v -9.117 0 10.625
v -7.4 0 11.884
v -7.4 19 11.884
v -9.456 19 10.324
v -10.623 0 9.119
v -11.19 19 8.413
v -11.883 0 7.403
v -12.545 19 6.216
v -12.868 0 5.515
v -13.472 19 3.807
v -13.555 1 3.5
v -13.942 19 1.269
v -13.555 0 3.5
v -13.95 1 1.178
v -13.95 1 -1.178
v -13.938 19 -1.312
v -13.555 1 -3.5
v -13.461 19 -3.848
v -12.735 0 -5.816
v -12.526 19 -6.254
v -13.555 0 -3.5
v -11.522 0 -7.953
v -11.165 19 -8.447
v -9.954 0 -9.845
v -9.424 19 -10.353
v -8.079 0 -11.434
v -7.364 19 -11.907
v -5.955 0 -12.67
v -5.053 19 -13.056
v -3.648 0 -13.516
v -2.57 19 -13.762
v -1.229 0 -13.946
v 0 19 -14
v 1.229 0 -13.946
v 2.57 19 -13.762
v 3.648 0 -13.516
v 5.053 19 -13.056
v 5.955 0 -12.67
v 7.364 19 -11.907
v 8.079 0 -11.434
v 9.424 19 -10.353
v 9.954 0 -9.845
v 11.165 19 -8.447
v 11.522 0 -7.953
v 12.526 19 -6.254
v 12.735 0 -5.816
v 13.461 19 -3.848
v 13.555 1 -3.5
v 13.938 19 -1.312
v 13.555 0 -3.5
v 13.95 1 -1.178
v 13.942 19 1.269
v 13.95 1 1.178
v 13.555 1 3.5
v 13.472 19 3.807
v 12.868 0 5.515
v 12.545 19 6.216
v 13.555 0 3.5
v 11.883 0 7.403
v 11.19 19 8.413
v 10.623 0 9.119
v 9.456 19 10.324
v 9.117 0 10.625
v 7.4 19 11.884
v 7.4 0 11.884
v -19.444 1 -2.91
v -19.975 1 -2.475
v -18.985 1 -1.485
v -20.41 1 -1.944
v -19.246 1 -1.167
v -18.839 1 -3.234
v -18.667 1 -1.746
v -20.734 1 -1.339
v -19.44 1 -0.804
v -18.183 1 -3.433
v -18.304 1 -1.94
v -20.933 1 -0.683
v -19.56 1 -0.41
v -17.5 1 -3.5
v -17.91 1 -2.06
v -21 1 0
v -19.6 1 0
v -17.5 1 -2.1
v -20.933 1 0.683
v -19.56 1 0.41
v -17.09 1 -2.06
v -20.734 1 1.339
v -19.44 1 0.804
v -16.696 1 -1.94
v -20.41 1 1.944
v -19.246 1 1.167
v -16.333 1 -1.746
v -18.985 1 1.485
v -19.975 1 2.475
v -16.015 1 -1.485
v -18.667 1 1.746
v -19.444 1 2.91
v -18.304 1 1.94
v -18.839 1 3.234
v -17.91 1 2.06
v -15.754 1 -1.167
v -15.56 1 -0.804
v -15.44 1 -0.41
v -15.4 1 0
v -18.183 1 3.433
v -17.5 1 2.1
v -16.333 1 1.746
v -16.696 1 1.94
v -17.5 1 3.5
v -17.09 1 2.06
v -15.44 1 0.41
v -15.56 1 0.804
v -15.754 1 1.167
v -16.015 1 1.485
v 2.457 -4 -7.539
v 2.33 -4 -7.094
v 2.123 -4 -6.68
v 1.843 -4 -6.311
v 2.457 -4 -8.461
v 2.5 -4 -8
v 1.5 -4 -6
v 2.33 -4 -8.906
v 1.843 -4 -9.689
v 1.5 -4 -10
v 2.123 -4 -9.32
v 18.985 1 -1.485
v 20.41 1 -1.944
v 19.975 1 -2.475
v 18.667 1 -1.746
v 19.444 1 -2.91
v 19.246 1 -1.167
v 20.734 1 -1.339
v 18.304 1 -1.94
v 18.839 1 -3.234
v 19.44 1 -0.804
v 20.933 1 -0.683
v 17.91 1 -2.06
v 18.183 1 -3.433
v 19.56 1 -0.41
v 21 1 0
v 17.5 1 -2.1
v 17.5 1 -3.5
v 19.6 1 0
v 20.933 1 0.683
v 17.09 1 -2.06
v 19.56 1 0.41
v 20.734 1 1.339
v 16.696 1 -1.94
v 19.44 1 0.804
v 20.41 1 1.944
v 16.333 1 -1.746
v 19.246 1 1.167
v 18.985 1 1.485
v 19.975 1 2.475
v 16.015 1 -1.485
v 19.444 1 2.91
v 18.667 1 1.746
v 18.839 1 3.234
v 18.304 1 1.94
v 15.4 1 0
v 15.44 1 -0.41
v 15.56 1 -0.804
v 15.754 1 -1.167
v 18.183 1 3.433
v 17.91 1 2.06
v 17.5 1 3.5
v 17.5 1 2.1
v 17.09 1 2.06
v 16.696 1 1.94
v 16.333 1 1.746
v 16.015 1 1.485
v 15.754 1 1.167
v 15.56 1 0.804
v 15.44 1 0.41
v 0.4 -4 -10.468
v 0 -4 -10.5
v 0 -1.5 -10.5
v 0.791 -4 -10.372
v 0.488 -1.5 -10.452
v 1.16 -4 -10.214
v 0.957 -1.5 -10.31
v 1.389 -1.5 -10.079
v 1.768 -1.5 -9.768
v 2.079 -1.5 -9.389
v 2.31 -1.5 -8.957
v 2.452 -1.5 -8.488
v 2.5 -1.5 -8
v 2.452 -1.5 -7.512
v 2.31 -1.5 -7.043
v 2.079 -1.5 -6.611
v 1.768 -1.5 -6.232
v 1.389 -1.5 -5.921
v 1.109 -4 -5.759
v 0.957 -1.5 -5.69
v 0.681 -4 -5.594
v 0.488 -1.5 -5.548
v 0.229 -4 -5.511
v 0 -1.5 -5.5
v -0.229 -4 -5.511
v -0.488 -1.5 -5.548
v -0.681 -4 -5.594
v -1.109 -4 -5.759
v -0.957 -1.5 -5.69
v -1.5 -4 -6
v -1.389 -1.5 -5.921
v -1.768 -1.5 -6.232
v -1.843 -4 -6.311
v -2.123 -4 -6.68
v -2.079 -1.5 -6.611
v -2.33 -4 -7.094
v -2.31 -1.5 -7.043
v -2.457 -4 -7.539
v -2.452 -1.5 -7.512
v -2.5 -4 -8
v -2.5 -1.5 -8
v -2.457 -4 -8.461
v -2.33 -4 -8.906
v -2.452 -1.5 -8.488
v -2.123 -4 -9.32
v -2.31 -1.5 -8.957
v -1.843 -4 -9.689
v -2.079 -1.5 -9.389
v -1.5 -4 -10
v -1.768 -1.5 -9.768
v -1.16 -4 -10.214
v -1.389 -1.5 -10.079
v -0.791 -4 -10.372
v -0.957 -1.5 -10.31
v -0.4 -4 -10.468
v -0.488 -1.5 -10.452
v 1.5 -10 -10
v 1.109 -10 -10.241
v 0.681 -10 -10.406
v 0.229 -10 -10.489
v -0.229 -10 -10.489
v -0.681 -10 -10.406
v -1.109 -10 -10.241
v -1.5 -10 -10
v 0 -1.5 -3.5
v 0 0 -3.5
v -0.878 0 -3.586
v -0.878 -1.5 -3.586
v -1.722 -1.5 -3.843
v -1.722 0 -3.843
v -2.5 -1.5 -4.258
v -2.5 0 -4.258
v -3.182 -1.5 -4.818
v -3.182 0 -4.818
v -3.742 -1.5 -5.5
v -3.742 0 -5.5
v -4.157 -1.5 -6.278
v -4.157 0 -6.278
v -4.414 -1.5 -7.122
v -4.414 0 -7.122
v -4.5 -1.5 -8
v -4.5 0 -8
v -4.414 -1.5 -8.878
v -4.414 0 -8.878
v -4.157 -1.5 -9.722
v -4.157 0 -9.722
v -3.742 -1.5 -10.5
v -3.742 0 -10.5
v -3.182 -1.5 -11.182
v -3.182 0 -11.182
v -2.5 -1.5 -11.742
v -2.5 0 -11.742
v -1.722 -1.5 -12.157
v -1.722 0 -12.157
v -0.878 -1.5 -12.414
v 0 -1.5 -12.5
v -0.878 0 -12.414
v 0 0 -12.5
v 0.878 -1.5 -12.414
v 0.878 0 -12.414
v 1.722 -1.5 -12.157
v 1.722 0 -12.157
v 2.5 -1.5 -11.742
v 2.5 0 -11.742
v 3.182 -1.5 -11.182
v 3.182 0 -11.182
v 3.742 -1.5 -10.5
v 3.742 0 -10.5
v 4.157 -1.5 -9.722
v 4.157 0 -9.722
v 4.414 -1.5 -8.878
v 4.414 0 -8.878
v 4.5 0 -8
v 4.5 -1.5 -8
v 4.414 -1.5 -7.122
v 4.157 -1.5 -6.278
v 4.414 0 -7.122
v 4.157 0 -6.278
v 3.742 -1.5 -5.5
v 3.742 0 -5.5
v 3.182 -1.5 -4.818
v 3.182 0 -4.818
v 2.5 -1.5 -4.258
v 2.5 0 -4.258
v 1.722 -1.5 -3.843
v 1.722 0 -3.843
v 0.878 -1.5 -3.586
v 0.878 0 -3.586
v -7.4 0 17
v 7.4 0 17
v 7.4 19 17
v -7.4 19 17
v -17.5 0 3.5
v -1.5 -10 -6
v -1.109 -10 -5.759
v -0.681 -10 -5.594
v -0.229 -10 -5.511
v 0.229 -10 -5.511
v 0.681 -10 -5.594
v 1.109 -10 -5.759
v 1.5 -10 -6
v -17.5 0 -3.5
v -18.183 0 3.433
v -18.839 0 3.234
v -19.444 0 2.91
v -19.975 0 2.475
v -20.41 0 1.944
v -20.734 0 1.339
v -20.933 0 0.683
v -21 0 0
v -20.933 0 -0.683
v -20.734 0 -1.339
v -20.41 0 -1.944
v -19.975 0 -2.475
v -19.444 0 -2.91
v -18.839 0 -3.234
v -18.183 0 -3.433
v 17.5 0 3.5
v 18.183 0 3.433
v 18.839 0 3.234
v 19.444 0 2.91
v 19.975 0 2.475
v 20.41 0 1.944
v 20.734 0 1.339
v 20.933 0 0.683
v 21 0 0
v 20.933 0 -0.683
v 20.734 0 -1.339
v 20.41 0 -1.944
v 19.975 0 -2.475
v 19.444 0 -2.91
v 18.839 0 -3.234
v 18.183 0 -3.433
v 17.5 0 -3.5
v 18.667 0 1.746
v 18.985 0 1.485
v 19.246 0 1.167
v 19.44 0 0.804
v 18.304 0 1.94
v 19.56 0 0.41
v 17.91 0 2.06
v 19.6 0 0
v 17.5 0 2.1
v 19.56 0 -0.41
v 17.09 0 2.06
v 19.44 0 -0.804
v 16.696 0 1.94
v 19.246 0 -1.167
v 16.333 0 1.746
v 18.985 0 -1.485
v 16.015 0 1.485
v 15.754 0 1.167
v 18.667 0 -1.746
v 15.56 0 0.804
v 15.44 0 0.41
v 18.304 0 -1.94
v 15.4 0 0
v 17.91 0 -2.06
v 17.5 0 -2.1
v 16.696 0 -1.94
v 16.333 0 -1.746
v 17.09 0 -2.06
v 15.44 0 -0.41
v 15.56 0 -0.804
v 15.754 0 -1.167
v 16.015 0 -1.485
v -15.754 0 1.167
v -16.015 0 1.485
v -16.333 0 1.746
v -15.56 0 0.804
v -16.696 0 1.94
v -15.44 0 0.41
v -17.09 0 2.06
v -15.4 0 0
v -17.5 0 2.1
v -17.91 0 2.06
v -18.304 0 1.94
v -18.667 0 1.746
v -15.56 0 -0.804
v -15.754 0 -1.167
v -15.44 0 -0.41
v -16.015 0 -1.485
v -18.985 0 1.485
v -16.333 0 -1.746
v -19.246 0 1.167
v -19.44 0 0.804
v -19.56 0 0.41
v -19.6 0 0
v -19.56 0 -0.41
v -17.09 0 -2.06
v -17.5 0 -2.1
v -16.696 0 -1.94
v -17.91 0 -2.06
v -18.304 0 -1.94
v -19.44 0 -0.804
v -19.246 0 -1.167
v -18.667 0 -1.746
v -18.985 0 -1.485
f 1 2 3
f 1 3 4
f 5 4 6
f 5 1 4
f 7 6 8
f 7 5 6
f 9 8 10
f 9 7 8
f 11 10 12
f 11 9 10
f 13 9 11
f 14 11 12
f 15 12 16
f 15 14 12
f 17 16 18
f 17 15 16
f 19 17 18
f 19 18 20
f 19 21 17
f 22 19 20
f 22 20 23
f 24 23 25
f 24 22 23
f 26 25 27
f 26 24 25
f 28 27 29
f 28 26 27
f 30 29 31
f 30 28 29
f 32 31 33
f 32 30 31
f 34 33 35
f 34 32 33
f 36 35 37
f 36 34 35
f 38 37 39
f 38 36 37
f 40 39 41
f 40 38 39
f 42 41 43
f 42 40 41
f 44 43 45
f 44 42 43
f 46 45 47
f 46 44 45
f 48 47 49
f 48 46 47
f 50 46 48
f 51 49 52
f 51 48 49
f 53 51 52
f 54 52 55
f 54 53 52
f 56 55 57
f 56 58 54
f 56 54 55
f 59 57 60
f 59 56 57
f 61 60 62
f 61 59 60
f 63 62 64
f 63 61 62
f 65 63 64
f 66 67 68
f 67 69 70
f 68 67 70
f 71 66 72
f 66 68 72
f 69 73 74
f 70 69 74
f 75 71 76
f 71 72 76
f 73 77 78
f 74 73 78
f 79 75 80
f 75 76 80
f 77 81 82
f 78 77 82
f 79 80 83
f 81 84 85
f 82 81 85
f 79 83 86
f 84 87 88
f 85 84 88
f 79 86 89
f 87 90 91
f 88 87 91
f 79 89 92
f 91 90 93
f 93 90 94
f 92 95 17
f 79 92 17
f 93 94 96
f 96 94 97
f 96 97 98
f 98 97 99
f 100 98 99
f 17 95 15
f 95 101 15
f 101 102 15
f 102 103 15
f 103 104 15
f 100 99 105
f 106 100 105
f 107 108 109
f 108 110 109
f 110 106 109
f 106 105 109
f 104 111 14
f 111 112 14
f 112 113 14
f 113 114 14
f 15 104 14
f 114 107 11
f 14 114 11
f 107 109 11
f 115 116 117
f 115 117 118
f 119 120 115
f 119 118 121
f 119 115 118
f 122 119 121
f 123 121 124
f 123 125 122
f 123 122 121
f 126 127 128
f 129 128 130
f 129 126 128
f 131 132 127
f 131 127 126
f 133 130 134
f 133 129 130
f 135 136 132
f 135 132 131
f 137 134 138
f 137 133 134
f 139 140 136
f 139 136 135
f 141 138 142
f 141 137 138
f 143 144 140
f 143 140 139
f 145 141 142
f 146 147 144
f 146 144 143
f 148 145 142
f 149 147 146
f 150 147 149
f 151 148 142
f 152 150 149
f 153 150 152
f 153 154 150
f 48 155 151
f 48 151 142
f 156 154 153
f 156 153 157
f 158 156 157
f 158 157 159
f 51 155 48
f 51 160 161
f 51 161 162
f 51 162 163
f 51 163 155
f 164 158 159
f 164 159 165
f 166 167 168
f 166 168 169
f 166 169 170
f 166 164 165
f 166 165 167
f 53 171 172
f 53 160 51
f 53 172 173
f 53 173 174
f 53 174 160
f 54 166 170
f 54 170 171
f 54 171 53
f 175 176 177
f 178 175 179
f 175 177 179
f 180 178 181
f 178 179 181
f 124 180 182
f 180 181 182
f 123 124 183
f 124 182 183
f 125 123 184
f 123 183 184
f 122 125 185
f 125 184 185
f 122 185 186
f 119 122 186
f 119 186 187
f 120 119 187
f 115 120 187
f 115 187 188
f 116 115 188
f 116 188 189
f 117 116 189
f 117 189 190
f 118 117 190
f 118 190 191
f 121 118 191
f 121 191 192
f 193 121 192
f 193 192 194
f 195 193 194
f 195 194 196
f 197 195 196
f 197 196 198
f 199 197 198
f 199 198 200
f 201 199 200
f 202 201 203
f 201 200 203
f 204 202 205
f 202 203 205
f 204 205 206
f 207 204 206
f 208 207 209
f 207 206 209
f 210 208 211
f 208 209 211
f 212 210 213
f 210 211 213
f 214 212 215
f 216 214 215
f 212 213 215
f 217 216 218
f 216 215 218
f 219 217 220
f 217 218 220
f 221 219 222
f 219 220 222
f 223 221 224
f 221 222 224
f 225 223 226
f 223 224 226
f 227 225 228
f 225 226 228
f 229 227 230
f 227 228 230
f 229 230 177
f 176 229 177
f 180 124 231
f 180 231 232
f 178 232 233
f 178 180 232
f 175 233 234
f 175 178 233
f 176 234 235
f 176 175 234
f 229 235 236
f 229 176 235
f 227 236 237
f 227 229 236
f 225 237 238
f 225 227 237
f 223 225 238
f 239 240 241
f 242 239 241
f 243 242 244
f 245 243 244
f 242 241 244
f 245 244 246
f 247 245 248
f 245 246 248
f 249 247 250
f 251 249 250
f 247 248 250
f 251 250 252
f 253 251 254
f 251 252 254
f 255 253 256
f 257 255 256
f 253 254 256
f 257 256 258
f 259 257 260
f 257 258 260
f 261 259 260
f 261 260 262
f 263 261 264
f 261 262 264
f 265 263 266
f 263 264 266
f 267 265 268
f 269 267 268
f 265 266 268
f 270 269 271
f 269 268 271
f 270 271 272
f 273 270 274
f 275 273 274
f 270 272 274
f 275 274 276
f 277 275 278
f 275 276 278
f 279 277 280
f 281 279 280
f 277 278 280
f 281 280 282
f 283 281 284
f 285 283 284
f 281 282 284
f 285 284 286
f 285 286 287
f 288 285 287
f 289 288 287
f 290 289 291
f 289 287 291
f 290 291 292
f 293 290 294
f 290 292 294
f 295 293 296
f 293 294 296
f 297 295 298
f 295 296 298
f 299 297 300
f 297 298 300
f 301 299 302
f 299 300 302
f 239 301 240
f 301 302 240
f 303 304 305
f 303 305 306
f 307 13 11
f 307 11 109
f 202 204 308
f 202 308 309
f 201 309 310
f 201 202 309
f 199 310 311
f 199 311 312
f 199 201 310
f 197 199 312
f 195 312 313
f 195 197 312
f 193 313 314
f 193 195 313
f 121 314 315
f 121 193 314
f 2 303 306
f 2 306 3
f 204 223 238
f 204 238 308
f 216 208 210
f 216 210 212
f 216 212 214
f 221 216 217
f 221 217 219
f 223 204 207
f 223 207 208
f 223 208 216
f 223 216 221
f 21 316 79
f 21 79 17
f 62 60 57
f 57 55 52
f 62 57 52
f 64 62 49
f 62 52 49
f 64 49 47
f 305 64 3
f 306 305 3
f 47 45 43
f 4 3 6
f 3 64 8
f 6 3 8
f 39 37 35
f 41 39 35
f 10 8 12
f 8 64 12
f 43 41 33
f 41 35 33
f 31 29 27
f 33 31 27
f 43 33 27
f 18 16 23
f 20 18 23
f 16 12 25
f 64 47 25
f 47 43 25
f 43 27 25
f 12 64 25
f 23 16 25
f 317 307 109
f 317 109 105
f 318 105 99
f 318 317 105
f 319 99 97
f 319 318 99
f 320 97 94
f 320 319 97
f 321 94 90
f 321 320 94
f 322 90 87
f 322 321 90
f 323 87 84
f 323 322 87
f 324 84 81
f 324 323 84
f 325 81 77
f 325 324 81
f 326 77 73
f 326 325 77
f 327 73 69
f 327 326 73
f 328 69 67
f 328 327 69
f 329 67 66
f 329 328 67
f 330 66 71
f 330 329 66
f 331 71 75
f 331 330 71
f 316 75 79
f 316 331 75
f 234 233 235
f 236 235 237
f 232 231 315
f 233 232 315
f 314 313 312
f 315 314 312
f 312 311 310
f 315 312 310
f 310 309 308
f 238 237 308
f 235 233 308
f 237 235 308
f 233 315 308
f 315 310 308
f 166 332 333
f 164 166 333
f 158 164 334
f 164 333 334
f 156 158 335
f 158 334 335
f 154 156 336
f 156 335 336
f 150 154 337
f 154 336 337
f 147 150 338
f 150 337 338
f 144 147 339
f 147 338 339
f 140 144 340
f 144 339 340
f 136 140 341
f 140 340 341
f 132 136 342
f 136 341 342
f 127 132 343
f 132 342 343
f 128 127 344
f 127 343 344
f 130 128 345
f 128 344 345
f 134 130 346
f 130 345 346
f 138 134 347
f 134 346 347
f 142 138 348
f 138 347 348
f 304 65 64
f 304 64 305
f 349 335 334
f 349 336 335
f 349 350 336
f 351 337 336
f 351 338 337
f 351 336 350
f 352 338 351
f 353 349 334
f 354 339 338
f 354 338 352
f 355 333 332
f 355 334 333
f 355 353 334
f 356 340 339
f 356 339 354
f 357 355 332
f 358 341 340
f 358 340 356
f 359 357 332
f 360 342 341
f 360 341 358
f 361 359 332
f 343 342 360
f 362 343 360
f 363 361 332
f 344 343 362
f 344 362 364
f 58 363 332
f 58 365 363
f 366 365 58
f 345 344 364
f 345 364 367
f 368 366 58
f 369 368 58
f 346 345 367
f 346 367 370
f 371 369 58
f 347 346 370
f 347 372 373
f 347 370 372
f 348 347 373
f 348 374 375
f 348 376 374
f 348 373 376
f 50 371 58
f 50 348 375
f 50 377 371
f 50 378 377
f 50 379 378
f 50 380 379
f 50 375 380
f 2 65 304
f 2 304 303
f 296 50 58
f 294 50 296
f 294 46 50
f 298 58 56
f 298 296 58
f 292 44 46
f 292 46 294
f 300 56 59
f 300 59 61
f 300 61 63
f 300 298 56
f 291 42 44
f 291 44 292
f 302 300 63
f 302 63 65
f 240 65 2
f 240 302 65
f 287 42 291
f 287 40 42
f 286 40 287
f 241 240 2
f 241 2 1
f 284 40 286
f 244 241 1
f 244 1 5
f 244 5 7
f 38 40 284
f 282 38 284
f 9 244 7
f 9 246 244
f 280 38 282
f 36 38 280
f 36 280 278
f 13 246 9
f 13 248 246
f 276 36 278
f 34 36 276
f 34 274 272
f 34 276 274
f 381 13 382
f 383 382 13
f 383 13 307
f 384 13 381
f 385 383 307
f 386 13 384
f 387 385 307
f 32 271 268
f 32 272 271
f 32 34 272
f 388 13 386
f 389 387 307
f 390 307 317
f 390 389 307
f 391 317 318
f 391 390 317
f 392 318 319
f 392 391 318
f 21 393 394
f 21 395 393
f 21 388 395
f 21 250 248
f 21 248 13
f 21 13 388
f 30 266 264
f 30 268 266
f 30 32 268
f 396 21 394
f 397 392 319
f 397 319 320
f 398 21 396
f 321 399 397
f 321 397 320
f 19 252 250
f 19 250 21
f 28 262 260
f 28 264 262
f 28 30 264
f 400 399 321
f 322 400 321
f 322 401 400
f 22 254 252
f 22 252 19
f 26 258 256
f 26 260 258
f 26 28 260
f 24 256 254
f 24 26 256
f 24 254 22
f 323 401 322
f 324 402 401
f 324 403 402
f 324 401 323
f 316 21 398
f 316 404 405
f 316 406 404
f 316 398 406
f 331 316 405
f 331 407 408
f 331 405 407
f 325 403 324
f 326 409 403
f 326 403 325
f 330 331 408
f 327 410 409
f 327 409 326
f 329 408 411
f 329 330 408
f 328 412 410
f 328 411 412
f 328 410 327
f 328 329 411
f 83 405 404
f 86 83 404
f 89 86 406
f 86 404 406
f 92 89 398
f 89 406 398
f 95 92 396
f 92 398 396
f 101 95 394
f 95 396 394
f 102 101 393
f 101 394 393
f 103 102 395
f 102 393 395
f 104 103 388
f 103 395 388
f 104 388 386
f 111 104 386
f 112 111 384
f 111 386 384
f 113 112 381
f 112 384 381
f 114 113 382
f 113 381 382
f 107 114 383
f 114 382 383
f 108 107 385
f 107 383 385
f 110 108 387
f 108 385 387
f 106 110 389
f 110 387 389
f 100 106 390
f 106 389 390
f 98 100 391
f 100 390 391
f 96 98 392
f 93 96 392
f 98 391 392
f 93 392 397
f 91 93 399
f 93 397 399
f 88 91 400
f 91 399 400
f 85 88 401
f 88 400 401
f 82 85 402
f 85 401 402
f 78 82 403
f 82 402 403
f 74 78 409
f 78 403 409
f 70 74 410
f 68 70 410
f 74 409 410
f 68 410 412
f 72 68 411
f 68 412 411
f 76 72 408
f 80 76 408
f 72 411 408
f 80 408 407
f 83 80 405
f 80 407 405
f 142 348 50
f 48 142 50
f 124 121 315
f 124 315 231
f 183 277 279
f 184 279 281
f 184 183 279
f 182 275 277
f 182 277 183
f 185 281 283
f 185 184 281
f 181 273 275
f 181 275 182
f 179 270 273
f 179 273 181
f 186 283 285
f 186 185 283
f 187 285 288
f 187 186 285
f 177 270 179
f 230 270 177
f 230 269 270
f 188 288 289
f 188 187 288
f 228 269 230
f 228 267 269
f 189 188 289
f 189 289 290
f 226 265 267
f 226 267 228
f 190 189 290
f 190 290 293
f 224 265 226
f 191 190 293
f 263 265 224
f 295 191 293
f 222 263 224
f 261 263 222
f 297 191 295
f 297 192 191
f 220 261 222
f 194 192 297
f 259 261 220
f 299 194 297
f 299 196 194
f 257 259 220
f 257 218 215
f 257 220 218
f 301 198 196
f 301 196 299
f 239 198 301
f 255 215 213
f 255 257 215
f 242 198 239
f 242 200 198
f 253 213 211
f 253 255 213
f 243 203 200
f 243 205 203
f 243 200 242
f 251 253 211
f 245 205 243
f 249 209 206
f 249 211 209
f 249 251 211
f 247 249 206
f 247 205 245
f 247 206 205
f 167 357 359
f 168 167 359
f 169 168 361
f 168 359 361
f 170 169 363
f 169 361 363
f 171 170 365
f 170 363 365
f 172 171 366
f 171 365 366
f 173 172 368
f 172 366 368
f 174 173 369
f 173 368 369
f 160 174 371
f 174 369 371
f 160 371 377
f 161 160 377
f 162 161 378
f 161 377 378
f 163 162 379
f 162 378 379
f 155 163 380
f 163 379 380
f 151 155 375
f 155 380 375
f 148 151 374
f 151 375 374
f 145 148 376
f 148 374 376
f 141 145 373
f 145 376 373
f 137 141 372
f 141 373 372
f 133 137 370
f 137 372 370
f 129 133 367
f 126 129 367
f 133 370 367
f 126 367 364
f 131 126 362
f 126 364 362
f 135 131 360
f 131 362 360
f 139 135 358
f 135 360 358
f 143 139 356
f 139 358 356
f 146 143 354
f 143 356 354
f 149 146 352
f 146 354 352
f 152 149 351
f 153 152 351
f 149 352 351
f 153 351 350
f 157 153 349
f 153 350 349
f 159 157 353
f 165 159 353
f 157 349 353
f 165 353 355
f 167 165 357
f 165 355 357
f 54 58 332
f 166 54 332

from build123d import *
from build123d.topology import SkipClean

# Parameters (mm, degrees)
BOSS_EXTRUDE1_DEPTH = 19
SKETCH2_R           = 2.1
BOSS_EXTRUDE2_DEPTH = 1
SKETCH3_R           = 4.5
BOSS_EXTRUDE3_DEPTH = 1.5
SKETCH4_R           = 2.5
BOSS_EXTRUDE4_DEPTH = 2.5
BOSS_EXTRUDE5_DEPTH = 6


with BuildPart() as part:
    # Sketch1 → Boss-Extrude1 (new body)
    with BuildSketch(Plane(origin=(0, 0, 0), x_dir=(1, 0, 0), z_dir=(0, 1, 0))):
        with BuildLine():
            Line((-7.4, -17), (-7.4, -11.884443613))
            ThreePointArc((-7.4, -11.884443613), (0, 14), (7.4, -11.884443613))
            Line((7.4, -11.884443613), (7.4, -17))
            Line((7.4, -17), (-7.4, -17))
        make_face()
    extrude(amount=BOSS_EXTRUDE1_DEPTH)

    # Sketch2 → Boss-Extrude2 (add)
    # profile 1 of 2: a face of its own
    with BuildSketch(Plane.XZ):
        with BuildLine():
            Line((13.555441712, -3.5), (13.555441712, 3.5))
            Line((13.555441712, 3.5), (17.5, 3.5))
            ThreePointArc((17.5, 3.5), (21, 0), (17.5, -3.5))
            Line((17.5, -3.5), (13.555441712, -3.5))
        make_face()
        with Locations(Location((17.5, 0, 0), (0, 0, 90))):
            Circle(SKETCH2_R, mode=Mode.SUBTRACT)
    # profile 2 of 2: a face of its own
    with BuildSketch(Plane.XZ):
        with BuildLine():
            Line((-17.5, -3.5), (-13.555441712, -3.5))
            Line((-13.555441712, -3.5), (-13.555441712, 3.5))
            Line((-13.555441712, 3.5), (-17.5, 3.5))
            ThreePointArc((-17.5, 3.5), (-21, 0), (-17.5, -3.5))
        make_face()
        with Locations(Location((-17.5, 0, 0), (0, 0, 270))):
            Circle(SKETCH2_R, mode=Mode.SUBTRACT)
    extrude(amount=-BOSS_EXTRUDE2_DEPTH)

    # Sketch3 → Boss-Extrude3 (add)
    with BuildSketch(Plane.XZ):
        with Locations(Location((0, -8, 0), (0, 0, 90))):
            Circle(SKETCH3_R)
    extrude(amount=BOSS_EXTRUDE3_DEPTH)

    # Sketch4 → Boss-Extrude4 (add)
    with BuildSketch(Plane.XZ.offset(1.5)):
        with Locations(Location((0, -8, 0), (0, 0, 270))):
            Circle(SKETCH4_R)
    extrude(amount=BOSS_EXTRUDE4_DEPTH)

    # Sketch5 → Boss-Extrude5 (add)
    with SkipClean():  # the faces are left unmerged after this step: merging them gives an invalid solid
        with BuildSketch(Plane.XZ.offset(4)):
            with BuildLine():
                Line((-1.5, -10), (-1.5, -6))
                ThreePointArc((-1.5, -6), (0, -5.5), (1.5, -6))
                Line((1.5, -6), (1.5, -10))
                ThreePointArc((1.5, -10), (0, -10.5), (-1.5, -10))
            make_face()
        extrude(amount=BOSS_EXTRUDE5_DEPTH)


solid = part.part
